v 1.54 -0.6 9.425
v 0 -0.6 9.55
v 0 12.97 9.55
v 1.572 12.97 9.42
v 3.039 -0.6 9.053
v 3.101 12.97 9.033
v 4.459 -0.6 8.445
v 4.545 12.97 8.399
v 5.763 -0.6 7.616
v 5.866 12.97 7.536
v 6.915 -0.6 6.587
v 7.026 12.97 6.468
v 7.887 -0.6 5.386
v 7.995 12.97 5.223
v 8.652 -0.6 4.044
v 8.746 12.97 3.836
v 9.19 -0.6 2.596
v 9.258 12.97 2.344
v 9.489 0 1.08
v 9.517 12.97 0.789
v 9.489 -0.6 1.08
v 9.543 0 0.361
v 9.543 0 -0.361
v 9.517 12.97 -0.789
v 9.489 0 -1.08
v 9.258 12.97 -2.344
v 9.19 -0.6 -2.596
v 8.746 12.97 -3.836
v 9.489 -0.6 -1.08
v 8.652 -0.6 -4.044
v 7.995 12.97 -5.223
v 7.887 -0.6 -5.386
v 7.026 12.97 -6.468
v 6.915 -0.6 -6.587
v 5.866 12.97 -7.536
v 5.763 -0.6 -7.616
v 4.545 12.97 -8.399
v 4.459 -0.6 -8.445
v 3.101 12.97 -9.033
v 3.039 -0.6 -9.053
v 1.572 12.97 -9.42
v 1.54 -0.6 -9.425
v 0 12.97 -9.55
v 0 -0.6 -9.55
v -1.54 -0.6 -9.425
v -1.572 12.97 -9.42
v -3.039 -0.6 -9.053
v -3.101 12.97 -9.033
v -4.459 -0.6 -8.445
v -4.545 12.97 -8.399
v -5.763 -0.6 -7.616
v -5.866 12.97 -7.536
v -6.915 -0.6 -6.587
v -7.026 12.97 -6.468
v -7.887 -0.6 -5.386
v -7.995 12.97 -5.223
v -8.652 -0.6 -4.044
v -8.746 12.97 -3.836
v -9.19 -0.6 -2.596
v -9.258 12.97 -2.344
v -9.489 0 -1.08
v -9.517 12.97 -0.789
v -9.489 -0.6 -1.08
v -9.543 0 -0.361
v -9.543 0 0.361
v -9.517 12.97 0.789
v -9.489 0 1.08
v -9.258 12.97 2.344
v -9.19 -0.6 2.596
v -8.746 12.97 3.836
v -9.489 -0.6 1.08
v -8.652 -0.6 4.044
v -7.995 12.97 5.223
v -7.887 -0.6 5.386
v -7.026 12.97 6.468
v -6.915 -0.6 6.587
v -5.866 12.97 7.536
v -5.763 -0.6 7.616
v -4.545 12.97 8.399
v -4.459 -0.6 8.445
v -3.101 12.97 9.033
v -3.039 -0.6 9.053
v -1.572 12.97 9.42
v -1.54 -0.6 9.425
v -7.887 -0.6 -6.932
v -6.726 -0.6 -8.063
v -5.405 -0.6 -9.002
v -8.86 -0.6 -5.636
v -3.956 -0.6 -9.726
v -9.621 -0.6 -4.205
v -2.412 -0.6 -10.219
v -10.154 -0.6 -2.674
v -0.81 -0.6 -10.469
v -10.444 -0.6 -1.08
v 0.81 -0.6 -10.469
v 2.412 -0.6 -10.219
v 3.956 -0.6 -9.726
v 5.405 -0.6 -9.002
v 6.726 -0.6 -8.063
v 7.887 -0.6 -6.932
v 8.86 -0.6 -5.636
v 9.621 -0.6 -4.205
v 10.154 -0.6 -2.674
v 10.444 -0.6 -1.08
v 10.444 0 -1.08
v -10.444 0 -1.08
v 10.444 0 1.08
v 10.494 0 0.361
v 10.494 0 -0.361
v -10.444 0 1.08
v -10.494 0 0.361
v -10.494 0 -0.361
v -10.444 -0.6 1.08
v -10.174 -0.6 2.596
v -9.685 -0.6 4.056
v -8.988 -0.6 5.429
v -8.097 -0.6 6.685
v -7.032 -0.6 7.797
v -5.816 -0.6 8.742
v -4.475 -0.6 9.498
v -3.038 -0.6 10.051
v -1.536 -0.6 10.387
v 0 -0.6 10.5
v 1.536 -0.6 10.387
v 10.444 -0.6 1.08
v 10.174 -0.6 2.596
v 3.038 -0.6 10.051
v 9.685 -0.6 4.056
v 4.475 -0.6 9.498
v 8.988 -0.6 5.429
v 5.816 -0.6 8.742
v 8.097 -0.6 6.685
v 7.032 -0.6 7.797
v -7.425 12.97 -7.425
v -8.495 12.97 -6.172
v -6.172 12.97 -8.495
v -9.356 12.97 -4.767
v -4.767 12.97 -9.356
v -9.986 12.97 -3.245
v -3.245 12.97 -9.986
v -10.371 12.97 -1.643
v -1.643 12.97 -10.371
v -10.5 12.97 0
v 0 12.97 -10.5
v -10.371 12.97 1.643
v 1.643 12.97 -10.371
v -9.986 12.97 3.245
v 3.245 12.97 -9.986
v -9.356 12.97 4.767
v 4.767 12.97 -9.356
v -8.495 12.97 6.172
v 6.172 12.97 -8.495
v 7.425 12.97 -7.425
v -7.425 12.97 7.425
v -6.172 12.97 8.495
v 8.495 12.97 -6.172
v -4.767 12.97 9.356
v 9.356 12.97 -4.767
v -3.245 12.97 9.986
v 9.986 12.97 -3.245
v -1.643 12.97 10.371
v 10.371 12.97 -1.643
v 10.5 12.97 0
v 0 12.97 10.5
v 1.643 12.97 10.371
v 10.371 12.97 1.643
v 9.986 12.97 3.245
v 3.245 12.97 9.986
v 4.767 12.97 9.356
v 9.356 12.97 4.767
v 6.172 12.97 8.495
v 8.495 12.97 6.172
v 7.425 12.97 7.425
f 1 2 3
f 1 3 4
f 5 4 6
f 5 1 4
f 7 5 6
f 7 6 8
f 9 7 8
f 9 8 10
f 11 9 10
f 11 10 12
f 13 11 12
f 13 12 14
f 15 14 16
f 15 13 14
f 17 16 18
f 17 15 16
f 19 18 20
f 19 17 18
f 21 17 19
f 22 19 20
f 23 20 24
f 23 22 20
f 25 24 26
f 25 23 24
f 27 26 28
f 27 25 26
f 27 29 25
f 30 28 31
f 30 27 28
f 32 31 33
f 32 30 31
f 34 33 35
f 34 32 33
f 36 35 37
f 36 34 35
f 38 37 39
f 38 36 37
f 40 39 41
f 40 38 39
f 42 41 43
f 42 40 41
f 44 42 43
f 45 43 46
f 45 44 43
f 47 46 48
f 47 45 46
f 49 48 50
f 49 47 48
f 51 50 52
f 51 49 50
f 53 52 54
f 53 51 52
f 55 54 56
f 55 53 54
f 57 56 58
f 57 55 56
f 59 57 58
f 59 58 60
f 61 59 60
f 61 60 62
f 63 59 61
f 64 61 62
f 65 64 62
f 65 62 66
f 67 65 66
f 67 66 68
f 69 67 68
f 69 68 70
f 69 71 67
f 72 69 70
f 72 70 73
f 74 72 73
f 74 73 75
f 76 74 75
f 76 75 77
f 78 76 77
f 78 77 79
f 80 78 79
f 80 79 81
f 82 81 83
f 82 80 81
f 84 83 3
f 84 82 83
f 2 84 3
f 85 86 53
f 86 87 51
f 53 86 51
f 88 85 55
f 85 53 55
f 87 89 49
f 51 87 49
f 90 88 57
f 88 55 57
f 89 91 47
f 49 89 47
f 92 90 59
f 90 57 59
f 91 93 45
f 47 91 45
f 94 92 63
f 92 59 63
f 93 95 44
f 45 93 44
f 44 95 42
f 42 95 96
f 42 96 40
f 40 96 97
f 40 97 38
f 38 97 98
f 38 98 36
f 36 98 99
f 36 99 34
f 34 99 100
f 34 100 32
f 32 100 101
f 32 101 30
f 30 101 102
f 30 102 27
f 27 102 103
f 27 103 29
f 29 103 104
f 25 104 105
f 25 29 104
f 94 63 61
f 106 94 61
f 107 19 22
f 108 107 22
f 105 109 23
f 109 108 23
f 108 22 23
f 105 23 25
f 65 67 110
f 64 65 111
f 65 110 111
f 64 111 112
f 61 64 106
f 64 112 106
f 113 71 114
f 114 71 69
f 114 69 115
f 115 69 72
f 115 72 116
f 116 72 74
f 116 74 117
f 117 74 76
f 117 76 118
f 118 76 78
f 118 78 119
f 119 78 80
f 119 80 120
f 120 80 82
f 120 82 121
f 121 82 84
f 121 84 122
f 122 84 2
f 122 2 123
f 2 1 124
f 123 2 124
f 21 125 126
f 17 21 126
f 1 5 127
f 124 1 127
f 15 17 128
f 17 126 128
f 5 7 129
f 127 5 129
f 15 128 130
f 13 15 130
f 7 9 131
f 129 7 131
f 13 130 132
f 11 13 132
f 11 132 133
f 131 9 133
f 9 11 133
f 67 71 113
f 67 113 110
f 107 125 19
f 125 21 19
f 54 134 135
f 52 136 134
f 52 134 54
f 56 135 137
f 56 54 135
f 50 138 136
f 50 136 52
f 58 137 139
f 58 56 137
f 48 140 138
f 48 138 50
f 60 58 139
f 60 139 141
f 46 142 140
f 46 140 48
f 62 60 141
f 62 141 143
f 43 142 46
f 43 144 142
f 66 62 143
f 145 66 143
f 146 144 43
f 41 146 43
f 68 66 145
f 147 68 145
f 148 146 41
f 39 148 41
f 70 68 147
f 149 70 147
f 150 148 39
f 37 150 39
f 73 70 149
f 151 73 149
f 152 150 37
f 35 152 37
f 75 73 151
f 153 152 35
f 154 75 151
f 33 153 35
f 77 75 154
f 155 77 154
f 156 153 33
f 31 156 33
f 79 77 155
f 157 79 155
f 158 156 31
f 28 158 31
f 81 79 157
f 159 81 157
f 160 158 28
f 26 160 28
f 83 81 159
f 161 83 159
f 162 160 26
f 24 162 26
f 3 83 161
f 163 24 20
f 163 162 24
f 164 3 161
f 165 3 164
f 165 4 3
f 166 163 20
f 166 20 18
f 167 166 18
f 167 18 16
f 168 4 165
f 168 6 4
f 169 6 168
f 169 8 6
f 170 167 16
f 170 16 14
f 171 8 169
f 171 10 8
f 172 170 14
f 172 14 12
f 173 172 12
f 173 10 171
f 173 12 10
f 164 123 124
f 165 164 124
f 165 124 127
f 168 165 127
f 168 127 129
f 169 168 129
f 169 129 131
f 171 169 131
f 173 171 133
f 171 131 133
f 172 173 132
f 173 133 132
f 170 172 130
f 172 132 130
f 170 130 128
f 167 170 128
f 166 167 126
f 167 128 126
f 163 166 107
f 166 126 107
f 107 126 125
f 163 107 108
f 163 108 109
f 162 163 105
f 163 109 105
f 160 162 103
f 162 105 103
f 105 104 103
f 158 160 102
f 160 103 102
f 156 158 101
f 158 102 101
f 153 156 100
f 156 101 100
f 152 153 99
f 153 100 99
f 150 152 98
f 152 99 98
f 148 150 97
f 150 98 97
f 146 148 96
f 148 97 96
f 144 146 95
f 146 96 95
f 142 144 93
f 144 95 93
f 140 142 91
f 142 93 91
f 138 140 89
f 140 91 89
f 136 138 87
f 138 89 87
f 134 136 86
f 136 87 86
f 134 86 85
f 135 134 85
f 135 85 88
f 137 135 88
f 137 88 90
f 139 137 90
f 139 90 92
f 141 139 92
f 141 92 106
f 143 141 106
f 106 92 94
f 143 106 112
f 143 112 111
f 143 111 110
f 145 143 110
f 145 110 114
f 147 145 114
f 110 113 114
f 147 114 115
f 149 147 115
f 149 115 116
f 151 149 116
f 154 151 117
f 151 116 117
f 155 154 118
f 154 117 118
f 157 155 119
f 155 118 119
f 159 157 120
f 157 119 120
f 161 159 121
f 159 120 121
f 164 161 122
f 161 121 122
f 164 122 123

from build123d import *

# Parameters (mm, degrees)
BOSS_EXTRUDE1_DEPTH      = 12.97
BOSS_EXTRUDE1_DEPTH_BACK = 0.6
SKETCH1_R                = 10.5
SKETCH1_R_2              = 9.55
CUT_EXTRUDE1_DEPTH       = 20.716006188
CUT_EXTRUDE1_DEPTH_BACK  = 20.716006188
SKETCH2_W                = 2.16
SKETCH2_H                = 0.617422303


with BuildPart() as part:
    # Sketch1 → Boss-Extrude1 (new, two sides: drawn at the far end of the back side and taken through both)
    with BuildSketch(Plane(origin=(0, 0, 0), x_dir=(1, 0, 0), z_dir=(0, 1, 0)).offset(-BOSS_EXTRUDE1_DEPTH_BACK)):
        with Locations(Location((0, 0, 0), (0, 0, 270))):
            Circle(SKETCH1_R)
        with Locations(Location((0, 0, 0), (0, 0, 270))):
            Circle(SKETCH1_R_2, mode=Mode.SUBTRACT)
    extrude(amount=BOSS_EXTRUDE1_DEPTH + BOSS_EXTRUDE1_DEPTH_BACK)

    # Sketch2 → Cut-Extrude1 (cut, two sides: drawn at the far end of the back side and taken through both)
    with BuildSketch(Plane(origin=(0, 0, 0), x_dir=(0, 0, -1), z_dir=(1, 0, 0)).offset(-CUT_EXTRUDE1_DEPTH_BACK)):
        with Locations((0, -0.308711152)):
            Rectangle(SKETCH2_W, SKETCH2_H)
    extrude(amount=CUT_EXTRUDE1_DEPTH + CUT_EXTRUDE1_DEPTH_BACK, mode=Mode.SUBTRACT)


solid = part.part
